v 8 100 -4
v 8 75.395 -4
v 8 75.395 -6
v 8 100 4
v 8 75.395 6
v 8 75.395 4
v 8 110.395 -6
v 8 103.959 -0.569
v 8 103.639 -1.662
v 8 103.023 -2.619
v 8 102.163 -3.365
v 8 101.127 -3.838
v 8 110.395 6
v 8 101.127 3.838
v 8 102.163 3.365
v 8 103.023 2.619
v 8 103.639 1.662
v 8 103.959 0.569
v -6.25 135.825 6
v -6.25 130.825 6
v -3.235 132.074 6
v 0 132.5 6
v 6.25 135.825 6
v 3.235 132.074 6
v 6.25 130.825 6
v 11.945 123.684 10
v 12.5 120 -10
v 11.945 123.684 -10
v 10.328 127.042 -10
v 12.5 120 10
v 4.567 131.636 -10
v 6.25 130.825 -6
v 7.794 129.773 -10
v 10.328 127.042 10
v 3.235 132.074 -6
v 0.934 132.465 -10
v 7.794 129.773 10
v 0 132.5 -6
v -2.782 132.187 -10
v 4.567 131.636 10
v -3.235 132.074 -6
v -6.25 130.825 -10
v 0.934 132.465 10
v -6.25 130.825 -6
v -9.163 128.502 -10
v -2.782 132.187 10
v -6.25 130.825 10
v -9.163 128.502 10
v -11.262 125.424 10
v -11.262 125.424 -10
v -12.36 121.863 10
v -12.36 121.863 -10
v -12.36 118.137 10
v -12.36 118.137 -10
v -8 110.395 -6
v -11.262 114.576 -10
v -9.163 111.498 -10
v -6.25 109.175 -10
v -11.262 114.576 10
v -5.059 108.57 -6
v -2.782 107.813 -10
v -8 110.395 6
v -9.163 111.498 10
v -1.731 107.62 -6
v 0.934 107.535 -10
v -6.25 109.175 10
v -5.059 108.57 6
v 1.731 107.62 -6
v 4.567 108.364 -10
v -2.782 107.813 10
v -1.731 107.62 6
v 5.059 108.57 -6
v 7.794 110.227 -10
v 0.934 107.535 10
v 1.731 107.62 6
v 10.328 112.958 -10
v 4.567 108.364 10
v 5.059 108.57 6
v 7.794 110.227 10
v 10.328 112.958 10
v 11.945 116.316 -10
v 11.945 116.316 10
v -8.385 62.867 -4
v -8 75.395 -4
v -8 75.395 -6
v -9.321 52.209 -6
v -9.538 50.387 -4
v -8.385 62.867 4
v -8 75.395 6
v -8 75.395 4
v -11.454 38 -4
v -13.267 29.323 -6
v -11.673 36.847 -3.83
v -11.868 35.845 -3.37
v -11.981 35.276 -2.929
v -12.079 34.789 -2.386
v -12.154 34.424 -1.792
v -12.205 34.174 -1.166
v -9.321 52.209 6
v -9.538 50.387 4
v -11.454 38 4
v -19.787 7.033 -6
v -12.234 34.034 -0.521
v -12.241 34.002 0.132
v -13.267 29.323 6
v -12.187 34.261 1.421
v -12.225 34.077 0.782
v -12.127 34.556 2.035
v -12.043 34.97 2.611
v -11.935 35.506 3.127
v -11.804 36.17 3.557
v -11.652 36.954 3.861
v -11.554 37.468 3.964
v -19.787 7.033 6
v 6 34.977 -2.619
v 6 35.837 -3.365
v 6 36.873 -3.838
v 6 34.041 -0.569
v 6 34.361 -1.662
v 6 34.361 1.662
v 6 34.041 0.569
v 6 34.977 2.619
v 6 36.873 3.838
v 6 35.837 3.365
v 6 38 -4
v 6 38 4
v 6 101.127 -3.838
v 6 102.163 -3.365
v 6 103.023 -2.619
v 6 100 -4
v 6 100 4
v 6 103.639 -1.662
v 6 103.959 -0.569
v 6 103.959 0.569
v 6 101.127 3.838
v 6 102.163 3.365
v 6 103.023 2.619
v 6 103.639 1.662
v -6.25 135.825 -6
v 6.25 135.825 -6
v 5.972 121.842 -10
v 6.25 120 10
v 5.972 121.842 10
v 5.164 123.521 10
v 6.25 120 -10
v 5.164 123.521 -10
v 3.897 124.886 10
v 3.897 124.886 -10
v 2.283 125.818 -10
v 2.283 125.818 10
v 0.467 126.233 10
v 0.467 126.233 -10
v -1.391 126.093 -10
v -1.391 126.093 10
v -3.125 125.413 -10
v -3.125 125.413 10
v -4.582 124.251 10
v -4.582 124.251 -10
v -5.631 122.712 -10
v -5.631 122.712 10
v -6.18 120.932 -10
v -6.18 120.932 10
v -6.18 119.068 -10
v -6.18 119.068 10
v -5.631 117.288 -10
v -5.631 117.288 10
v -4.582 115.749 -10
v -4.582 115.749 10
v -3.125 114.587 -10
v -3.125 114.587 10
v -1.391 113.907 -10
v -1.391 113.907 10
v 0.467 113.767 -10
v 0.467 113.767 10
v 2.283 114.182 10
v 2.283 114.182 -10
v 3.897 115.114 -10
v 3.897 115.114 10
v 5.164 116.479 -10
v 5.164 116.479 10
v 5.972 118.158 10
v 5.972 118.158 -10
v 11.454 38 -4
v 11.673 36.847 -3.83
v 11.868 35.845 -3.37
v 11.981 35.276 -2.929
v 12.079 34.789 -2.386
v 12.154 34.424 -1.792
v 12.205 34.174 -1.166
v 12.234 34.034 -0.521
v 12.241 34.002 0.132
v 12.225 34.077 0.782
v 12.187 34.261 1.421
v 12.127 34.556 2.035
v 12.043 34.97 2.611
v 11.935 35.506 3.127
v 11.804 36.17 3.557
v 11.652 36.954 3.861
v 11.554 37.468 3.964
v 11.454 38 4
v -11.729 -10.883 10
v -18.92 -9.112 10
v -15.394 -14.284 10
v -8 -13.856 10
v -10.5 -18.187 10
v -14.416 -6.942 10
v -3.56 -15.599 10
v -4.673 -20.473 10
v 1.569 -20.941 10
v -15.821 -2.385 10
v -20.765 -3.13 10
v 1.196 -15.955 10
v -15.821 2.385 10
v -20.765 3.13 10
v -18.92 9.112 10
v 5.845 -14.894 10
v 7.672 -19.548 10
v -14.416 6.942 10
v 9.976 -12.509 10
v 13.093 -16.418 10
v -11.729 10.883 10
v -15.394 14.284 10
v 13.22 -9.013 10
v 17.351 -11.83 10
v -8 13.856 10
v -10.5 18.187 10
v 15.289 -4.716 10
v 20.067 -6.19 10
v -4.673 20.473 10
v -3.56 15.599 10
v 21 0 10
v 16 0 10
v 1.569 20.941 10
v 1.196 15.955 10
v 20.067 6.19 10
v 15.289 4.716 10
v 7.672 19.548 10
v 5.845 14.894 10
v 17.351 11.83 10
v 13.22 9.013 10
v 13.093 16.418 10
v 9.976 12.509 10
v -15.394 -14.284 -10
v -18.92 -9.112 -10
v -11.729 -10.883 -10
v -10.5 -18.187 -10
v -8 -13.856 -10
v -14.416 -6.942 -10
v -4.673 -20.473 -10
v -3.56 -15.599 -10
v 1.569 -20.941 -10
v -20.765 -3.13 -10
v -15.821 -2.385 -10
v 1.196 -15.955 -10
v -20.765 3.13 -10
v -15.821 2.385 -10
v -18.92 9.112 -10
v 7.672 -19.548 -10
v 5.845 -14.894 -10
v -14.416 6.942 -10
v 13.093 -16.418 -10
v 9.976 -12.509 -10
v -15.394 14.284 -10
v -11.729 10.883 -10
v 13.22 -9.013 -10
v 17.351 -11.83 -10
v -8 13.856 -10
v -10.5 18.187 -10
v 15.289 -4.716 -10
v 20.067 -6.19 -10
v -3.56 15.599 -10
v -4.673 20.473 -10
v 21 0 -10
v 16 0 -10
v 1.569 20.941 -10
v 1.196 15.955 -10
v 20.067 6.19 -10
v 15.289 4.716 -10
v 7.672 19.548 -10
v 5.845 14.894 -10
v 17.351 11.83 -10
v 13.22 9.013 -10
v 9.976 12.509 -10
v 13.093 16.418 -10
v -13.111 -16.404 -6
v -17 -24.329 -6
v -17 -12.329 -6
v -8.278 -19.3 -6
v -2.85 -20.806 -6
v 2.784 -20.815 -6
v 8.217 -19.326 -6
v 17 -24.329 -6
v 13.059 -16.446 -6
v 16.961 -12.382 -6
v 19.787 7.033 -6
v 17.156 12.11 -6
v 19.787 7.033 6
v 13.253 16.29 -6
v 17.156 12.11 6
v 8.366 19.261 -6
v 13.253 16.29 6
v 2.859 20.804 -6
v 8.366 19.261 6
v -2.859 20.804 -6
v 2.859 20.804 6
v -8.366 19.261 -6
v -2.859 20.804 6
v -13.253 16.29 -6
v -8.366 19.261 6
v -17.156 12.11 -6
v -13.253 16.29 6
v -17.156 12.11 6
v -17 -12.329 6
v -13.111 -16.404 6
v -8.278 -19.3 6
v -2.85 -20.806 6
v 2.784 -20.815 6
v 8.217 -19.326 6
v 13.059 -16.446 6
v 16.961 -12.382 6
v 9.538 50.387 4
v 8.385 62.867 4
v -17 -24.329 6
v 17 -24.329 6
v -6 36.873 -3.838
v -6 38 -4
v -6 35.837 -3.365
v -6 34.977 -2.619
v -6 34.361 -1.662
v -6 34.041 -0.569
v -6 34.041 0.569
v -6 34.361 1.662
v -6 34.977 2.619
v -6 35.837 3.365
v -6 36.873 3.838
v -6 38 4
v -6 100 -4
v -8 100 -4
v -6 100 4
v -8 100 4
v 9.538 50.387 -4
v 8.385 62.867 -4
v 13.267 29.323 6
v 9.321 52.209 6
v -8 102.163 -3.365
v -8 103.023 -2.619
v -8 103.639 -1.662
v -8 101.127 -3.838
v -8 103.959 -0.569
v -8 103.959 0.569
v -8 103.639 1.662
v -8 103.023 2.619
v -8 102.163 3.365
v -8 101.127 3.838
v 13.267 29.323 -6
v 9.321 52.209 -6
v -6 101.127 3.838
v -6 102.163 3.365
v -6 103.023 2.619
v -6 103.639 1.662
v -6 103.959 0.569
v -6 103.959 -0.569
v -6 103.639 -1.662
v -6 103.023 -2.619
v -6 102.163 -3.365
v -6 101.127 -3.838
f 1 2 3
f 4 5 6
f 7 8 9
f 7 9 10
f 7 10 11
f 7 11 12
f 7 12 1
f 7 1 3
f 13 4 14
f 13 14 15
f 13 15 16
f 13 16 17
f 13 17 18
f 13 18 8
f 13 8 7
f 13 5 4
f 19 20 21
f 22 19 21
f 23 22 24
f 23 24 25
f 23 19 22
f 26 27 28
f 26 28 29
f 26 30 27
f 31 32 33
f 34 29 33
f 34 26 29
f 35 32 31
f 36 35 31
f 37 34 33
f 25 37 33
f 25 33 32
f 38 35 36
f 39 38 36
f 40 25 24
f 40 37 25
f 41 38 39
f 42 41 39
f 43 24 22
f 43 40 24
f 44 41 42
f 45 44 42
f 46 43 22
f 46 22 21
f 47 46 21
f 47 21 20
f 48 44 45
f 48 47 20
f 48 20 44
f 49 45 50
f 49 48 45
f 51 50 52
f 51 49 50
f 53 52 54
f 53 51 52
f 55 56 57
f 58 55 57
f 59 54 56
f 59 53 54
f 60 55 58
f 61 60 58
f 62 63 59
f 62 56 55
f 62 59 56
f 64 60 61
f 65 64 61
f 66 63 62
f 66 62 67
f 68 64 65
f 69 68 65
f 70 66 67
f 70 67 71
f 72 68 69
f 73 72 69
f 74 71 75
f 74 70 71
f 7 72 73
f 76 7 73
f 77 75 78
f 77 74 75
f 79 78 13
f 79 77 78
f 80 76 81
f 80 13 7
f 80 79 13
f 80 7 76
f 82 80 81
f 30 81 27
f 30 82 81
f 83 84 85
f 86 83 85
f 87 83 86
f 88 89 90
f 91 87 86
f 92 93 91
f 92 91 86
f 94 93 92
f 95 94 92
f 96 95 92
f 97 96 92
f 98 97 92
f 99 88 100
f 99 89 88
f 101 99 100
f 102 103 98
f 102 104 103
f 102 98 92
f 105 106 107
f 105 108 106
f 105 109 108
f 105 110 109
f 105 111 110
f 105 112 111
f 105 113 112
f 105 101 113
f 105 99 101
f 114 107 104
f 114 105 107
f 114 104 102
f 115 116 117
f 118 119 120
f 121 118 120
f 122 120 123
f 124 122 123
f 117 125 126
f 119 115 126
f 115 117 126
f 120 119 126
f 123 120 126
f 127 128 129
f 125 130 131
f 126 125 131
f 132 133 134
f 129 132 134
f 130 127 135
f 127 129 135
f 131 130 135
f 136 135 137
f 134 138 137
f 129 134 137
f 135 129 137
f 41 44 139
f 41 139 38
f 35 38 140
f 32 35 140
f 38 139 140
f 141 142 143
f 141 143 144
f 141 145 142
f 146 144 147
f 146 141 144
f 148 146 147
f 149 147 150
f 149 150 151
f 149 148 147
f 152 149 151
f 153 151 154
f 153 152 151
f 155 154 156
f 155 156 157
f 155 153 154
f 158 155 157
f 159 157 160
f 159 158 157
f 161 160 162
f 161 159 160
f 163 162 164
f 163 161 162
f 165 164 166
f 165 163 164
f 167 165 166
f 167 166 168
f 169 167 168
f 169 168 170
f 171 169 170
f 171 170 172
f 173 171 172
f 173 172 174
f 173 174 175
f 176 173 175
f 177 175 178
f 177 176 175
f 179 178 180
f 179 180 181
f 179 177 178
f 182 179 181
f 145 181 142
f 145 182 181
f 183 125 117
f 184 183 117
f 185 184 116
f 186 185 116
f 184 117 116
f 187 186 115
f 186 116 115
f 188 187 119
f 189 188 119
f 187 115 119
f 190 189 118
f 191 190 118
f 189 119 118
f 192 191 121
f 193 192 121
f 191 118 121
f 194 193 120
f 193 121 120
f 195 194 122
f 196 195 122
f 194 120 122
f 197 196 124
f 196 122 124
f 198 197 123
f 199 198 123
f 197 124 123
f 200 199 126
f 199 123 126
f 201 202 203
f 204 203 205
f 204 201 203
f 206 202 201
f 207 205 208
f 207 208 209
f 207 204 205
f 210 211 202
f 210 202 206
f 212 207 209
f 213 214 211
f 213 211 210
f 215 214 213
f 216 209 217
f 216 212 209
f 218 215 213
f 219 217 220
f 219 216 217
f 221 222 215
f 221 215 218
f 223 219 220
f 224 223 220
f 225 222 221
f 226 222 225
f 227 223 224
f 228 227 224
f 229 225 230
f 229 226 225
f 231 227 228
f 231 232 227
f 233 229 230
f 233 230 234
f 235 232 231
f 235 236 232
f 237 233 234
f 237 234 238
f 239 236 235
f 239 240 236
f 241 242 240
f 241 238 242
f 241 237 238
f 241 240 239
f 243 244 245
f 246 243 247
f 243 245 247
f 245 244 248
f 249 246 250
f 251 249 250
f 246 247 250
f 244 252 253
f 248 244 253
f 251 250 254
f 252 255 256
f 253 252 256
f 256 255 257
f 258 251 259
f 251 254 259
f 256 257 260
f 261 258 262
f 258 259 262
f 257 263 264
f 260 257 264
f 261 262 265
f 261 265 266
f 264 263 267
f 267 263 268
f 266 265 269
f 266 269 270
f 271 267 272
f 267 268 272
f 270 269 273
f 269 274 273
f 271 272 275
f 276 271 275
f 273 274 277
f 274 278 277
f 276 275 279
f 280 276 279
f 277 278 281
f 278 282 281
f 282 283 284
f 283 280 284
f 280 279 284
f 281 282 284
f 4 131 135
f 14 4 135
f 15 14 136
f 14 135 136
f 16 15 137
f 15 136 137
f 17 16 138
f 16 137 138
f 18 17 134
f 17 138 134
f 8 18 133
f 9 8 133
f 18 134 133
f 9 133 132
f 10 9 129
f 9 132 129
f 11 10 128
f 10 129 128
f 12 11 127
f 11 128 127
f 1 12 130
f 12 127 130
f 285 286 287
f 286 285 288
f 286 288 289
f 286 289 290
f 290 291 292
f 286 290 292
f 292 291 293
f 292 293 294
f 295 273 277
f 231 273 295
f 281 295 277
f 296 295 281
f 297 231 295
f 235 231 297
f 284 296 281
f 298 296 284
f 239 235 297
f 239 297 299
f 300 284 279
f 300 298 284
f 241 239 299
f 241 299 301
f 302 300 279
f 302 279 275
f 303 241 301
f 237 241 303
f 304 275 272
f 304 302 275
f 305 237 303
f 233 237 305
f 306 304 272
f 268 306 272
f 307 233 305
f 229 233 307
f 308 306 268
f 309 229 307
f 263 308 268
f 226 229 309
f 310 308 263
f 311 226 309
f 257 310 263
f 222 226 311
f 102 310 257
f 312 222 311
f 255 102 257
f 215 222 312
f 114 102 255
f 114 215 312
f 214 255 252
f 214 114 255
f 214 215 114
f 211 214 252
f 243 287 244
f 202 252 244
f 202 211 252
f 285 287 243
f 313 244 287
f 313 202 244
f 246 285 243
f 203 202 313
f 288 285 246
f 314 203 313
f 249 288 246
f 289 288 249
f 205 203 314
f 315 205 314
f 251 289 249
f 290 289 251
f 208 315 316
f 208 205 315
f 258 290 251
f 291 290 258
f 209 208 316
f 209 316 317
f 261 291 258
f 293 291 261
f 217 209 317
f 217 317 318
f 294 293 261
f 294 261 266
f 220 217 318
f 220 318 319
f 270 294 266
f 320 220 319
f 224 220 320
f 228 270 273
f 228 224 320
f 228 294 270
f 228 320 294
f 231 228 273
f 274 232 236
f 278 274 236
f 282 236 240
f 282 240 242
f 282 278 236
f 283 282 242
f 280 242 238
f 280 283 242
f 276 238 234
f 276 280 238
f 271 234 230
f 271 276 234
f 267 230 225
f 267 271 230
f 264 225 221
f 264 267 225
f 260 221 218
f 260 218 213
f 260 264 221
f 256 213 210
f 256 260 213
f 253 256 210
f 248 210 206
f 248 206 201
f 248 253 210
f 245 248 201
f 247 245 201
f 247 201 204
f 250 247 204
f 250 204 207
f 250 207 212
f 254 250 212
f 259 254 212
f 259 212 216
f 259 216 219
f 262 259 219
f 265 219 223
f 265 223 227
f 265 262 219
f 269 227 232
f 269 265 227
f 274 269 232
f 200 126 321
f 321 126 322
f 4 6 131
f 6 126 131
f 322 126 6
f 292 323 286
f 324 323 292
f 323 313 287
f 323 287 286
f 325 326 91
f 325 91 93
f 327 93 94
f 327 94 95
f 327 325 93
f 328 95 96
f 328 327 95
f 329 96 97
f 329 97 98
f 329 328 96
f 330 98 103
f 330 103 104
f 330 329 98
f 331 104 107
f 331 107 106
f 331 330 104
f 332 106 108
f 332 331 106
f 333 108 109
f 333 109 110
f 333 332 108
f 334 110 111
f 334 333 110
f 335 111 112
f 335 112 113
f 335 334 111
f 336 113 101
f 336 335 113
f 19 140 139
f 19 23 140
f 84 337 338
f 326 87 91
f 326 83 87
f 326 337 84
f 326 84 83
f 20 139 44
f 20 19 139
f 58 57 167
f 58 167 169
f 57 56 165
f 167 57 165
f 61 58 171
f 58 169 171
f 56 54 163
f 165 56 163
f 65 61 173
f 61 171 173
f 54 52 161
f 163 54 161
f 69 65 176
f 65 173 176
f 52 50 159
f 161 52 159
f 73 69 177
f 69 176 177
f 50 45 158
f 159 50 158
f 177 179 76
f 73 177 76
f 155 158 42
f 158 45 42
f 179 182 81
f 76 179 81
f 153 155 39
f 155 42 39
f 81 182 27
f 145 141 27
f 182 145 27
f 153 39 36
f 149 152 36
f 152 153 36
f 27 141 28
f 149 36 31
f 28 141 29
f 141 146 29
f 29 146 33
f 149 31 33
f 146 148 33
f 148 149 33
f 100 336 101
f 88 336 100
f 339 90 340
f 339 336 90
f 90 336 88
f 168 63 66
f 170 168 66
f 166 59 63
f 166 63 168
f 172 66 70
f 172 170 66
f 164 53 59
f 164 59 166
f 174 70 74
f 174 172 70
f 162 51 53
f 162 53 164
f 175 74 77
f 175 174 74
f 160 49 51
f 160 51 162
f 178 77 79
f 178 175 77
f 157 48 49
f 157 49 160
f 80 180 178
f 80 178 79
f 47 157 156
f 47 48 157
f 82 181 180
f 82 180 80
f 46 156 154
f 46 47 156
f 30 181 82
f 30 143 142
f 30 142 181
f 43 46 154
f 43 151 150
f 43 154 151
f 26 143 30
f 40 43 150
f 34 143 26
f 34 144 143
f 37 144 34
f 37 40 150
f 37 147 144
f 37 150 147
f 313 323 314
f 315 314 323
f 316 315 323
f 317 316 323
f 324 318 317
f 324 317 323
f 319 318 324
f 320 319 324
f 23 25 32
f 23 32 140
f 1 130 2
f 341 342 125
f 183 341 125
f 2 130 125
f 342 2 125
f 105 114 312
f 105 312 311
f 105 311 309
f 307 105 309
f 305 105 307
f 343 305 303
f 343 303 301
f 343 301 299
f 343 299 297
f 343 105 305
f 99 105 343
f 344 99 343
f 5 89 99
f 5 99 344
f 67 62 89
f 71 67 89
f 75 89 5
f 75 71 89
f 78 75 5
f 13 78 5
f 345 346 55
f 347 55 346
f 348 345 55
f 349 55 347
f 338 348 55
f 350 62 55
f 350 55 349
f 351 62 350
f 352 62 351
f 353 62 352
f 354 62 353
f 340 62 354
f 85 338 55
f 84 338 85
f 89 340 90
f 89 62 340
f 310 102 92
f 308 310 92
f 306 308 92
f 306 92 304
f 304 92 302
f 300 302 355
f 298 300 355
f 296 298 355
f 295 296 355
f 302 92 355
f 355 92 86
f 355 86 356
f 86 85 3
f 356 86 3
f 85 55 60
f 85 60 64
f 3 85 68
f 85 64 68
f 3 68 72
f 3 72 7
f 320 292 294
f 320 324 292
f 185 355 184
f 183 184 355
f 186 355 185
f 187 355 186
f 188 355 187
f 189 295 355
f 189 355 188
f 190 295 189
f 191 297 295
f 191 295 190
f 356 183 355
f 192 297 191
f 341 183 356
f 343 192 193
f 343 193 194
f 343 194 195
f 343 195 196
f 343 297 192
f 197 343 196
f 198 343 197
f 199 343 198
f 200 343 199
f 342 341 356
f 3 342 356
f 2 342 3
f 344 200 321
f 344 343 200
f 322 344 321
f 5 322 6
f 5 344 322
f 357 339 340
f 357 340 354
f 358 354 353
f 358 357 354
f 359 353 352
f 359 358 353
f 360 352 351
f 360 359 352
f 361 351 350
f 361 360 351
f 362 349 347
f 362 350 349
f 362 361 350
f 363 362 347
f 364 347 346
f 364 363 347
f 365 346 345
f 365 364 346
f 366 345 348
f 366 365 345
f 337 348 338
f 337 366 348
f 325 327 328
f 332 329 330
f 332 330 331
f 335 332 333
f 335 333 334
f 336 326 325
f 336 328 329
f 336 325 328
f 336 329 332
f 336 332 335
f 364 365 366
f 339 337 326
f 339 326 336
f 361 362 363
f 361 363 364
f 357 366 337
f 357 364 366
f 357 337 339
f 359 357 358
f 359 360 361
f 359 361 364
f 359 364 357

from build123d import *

# Parameters (mm, degrees)
SKETCH1_R             = 12.5
SKETCH1_R_2           = 6.25
BOSS_EXTRUDE1_DEPTH   = 10
SKETCH1_R_3           = 21
SKETCH1_R_4           = 16
BOSS_EXTRUDE1_2_DEPTH = 10
BOSS_EXTRUDE4_DEPTH   = 6
BOSS_EXTRUDE6_DEPTH   = 6
BOSS_EXTRUDE7_DEPTH   = 6
CUT_EXTRUDE1_START    = 6
CUT_EXTRUDE1_DEPTH    = 132.802456026
CUT_EXTRUDE3_START    = -6
CUT_EXTRUDE3_DEPTH    = 132.802456026


with BuildPart() as part:
    # Sketch1 → Boss-Extrude1 (new, symmetric)
    with BuildSketch(Plane.XY):
        with Locations((0, 120)):
            Circle(SKETCH1_R)
        with Locations((0, 120)):
            Circle(SKETCH1_R_2, mode=Mode.SUBTRACT)
    extrude(amount=BOSS_EXTRUDE1_DEPTH, both=True)



with BuildPart() as body_2:
    # Sketch1 → Boss-Extrude1 2 (new, symmetric)
    with BuildSketch(Plane.XY):
        Circle(SKETCH1_R_3)
        Circle(SKETCH1_R_4, mode=Mode.SUBTRACT)
    extrude(amount=BOSS_EXTRUDE1_2_DEPTH, both=True)


with BuildPart() as part_1:
    add(part.part)

    add(body_2.part)  # Boss-Extrude4 merges body 2
    # Sketch1<5> → Boss-Extrude4 (add, symmetric)
    with BuildSketch(Plane.XY):
        with BuildLine():
            ThreePointArc((8, 110.395313644), (0, 107.5), (-8, 110.395313644))
            Line((-8, 110.395313644), (-8, 75.395313644))
            ThreePointArc((-8, 75.395313644), (-10.96842855, 40.709642053), (-19.787382488, 7.032744434))
            ThreePointArc((-19.787382488, 7.032744434), (0, 21), (19.787382488, 7.032744434))
            ThreePointArc((19.787382488, 7.032744434), (10.96842855, 40.709642053), (8, 75.395313644))
            Line((8, 75.395313644), (8, 110.395313644))
        make_face()
    extrude(amount=BOSS_EXTRUDE4_DEPTH, both=True)

    # Sketch1<8> → Boss-Extrude6 (add, symmetric)
    with BuildSketch(Plane.XY):
        with BuildLine():
            ThreePointArc((16.961079982, -12.382316659), (-0.033074929, -20.999973954), (-17, -12.328828006))
            Line((-17, -12.328828006), (-17, -24.328828006))
            Line((-17, -24.328828006), (17, -24.328828006))
            Line((17, -24.328828006), (16.961079982, -12.382316659))
        make_face()
    extrude(amount=BOSS_EXTRUDE6_DEPTH, both=True)

    # Sketch1<9> → Boss-Extrude7 (add, symmetric)
    with BuildSketch(Plane.XY):
        with BuildLine():
            Line((-6.25, 135.825317547), (-6.25, 130.825317547))
            ThreePointArc((-6.25, 130.825317547), (0, 132.5), (6.25, 130.825317547))
            Line((6.25, 130.825317547), (6.25, 135.825317547))
            Line((6.25, 135.825317547), (-6.25, 135.825317547))
        make_face()
    extrude(amount=BOSS_EXTRUDE7_DEPTH, both=True)

    # Sketch4 → Cut-Extrude1 (cut, through all)
    with BuildSketch(Plane(origin=(0, 0, 0), x_dir=(0, 0, -1), z_dir=(1, 0, 0)).offset(CUT_EXTRUDE1_START)):
        with BuildLine():
            Line((4, 100), (4, 38))
            ThreePointArc((4, 38), (0, 34), (-4, 38))
            Line((-4, 38), (-4, 100))
            ThreePointArc((-4, 100), (0, 104), (4, 100))
        make_face()
    extrude(amount=CUT_EXTRUDE1_DEPTH, mode=Mode.SUBTRACT)

    # Sketch4<3> → Cut-Extrude3 (cut, through all)
    with BuildSketch(Plane(origin=(0, 0, 0), x_dir=(0, 0, -1), z_dir=(1, 0, 0)).offset(CUT_EXTRUDE3_START)):
        with BuildLine():
            Line((4, 100), (4, 38))
            ThreePointArc((4, 38), (0, 34), (-4, 38))
            Line((-4, 38), (-4, 100))
            ThreePointArc((-4, 100), (0, 104), (4, 100))
        make_face()
    extrude(amount=-CUT_EXTRUDE3_DEPTH, mode=Mode.SUBTRACT)


solid = part_1.part
